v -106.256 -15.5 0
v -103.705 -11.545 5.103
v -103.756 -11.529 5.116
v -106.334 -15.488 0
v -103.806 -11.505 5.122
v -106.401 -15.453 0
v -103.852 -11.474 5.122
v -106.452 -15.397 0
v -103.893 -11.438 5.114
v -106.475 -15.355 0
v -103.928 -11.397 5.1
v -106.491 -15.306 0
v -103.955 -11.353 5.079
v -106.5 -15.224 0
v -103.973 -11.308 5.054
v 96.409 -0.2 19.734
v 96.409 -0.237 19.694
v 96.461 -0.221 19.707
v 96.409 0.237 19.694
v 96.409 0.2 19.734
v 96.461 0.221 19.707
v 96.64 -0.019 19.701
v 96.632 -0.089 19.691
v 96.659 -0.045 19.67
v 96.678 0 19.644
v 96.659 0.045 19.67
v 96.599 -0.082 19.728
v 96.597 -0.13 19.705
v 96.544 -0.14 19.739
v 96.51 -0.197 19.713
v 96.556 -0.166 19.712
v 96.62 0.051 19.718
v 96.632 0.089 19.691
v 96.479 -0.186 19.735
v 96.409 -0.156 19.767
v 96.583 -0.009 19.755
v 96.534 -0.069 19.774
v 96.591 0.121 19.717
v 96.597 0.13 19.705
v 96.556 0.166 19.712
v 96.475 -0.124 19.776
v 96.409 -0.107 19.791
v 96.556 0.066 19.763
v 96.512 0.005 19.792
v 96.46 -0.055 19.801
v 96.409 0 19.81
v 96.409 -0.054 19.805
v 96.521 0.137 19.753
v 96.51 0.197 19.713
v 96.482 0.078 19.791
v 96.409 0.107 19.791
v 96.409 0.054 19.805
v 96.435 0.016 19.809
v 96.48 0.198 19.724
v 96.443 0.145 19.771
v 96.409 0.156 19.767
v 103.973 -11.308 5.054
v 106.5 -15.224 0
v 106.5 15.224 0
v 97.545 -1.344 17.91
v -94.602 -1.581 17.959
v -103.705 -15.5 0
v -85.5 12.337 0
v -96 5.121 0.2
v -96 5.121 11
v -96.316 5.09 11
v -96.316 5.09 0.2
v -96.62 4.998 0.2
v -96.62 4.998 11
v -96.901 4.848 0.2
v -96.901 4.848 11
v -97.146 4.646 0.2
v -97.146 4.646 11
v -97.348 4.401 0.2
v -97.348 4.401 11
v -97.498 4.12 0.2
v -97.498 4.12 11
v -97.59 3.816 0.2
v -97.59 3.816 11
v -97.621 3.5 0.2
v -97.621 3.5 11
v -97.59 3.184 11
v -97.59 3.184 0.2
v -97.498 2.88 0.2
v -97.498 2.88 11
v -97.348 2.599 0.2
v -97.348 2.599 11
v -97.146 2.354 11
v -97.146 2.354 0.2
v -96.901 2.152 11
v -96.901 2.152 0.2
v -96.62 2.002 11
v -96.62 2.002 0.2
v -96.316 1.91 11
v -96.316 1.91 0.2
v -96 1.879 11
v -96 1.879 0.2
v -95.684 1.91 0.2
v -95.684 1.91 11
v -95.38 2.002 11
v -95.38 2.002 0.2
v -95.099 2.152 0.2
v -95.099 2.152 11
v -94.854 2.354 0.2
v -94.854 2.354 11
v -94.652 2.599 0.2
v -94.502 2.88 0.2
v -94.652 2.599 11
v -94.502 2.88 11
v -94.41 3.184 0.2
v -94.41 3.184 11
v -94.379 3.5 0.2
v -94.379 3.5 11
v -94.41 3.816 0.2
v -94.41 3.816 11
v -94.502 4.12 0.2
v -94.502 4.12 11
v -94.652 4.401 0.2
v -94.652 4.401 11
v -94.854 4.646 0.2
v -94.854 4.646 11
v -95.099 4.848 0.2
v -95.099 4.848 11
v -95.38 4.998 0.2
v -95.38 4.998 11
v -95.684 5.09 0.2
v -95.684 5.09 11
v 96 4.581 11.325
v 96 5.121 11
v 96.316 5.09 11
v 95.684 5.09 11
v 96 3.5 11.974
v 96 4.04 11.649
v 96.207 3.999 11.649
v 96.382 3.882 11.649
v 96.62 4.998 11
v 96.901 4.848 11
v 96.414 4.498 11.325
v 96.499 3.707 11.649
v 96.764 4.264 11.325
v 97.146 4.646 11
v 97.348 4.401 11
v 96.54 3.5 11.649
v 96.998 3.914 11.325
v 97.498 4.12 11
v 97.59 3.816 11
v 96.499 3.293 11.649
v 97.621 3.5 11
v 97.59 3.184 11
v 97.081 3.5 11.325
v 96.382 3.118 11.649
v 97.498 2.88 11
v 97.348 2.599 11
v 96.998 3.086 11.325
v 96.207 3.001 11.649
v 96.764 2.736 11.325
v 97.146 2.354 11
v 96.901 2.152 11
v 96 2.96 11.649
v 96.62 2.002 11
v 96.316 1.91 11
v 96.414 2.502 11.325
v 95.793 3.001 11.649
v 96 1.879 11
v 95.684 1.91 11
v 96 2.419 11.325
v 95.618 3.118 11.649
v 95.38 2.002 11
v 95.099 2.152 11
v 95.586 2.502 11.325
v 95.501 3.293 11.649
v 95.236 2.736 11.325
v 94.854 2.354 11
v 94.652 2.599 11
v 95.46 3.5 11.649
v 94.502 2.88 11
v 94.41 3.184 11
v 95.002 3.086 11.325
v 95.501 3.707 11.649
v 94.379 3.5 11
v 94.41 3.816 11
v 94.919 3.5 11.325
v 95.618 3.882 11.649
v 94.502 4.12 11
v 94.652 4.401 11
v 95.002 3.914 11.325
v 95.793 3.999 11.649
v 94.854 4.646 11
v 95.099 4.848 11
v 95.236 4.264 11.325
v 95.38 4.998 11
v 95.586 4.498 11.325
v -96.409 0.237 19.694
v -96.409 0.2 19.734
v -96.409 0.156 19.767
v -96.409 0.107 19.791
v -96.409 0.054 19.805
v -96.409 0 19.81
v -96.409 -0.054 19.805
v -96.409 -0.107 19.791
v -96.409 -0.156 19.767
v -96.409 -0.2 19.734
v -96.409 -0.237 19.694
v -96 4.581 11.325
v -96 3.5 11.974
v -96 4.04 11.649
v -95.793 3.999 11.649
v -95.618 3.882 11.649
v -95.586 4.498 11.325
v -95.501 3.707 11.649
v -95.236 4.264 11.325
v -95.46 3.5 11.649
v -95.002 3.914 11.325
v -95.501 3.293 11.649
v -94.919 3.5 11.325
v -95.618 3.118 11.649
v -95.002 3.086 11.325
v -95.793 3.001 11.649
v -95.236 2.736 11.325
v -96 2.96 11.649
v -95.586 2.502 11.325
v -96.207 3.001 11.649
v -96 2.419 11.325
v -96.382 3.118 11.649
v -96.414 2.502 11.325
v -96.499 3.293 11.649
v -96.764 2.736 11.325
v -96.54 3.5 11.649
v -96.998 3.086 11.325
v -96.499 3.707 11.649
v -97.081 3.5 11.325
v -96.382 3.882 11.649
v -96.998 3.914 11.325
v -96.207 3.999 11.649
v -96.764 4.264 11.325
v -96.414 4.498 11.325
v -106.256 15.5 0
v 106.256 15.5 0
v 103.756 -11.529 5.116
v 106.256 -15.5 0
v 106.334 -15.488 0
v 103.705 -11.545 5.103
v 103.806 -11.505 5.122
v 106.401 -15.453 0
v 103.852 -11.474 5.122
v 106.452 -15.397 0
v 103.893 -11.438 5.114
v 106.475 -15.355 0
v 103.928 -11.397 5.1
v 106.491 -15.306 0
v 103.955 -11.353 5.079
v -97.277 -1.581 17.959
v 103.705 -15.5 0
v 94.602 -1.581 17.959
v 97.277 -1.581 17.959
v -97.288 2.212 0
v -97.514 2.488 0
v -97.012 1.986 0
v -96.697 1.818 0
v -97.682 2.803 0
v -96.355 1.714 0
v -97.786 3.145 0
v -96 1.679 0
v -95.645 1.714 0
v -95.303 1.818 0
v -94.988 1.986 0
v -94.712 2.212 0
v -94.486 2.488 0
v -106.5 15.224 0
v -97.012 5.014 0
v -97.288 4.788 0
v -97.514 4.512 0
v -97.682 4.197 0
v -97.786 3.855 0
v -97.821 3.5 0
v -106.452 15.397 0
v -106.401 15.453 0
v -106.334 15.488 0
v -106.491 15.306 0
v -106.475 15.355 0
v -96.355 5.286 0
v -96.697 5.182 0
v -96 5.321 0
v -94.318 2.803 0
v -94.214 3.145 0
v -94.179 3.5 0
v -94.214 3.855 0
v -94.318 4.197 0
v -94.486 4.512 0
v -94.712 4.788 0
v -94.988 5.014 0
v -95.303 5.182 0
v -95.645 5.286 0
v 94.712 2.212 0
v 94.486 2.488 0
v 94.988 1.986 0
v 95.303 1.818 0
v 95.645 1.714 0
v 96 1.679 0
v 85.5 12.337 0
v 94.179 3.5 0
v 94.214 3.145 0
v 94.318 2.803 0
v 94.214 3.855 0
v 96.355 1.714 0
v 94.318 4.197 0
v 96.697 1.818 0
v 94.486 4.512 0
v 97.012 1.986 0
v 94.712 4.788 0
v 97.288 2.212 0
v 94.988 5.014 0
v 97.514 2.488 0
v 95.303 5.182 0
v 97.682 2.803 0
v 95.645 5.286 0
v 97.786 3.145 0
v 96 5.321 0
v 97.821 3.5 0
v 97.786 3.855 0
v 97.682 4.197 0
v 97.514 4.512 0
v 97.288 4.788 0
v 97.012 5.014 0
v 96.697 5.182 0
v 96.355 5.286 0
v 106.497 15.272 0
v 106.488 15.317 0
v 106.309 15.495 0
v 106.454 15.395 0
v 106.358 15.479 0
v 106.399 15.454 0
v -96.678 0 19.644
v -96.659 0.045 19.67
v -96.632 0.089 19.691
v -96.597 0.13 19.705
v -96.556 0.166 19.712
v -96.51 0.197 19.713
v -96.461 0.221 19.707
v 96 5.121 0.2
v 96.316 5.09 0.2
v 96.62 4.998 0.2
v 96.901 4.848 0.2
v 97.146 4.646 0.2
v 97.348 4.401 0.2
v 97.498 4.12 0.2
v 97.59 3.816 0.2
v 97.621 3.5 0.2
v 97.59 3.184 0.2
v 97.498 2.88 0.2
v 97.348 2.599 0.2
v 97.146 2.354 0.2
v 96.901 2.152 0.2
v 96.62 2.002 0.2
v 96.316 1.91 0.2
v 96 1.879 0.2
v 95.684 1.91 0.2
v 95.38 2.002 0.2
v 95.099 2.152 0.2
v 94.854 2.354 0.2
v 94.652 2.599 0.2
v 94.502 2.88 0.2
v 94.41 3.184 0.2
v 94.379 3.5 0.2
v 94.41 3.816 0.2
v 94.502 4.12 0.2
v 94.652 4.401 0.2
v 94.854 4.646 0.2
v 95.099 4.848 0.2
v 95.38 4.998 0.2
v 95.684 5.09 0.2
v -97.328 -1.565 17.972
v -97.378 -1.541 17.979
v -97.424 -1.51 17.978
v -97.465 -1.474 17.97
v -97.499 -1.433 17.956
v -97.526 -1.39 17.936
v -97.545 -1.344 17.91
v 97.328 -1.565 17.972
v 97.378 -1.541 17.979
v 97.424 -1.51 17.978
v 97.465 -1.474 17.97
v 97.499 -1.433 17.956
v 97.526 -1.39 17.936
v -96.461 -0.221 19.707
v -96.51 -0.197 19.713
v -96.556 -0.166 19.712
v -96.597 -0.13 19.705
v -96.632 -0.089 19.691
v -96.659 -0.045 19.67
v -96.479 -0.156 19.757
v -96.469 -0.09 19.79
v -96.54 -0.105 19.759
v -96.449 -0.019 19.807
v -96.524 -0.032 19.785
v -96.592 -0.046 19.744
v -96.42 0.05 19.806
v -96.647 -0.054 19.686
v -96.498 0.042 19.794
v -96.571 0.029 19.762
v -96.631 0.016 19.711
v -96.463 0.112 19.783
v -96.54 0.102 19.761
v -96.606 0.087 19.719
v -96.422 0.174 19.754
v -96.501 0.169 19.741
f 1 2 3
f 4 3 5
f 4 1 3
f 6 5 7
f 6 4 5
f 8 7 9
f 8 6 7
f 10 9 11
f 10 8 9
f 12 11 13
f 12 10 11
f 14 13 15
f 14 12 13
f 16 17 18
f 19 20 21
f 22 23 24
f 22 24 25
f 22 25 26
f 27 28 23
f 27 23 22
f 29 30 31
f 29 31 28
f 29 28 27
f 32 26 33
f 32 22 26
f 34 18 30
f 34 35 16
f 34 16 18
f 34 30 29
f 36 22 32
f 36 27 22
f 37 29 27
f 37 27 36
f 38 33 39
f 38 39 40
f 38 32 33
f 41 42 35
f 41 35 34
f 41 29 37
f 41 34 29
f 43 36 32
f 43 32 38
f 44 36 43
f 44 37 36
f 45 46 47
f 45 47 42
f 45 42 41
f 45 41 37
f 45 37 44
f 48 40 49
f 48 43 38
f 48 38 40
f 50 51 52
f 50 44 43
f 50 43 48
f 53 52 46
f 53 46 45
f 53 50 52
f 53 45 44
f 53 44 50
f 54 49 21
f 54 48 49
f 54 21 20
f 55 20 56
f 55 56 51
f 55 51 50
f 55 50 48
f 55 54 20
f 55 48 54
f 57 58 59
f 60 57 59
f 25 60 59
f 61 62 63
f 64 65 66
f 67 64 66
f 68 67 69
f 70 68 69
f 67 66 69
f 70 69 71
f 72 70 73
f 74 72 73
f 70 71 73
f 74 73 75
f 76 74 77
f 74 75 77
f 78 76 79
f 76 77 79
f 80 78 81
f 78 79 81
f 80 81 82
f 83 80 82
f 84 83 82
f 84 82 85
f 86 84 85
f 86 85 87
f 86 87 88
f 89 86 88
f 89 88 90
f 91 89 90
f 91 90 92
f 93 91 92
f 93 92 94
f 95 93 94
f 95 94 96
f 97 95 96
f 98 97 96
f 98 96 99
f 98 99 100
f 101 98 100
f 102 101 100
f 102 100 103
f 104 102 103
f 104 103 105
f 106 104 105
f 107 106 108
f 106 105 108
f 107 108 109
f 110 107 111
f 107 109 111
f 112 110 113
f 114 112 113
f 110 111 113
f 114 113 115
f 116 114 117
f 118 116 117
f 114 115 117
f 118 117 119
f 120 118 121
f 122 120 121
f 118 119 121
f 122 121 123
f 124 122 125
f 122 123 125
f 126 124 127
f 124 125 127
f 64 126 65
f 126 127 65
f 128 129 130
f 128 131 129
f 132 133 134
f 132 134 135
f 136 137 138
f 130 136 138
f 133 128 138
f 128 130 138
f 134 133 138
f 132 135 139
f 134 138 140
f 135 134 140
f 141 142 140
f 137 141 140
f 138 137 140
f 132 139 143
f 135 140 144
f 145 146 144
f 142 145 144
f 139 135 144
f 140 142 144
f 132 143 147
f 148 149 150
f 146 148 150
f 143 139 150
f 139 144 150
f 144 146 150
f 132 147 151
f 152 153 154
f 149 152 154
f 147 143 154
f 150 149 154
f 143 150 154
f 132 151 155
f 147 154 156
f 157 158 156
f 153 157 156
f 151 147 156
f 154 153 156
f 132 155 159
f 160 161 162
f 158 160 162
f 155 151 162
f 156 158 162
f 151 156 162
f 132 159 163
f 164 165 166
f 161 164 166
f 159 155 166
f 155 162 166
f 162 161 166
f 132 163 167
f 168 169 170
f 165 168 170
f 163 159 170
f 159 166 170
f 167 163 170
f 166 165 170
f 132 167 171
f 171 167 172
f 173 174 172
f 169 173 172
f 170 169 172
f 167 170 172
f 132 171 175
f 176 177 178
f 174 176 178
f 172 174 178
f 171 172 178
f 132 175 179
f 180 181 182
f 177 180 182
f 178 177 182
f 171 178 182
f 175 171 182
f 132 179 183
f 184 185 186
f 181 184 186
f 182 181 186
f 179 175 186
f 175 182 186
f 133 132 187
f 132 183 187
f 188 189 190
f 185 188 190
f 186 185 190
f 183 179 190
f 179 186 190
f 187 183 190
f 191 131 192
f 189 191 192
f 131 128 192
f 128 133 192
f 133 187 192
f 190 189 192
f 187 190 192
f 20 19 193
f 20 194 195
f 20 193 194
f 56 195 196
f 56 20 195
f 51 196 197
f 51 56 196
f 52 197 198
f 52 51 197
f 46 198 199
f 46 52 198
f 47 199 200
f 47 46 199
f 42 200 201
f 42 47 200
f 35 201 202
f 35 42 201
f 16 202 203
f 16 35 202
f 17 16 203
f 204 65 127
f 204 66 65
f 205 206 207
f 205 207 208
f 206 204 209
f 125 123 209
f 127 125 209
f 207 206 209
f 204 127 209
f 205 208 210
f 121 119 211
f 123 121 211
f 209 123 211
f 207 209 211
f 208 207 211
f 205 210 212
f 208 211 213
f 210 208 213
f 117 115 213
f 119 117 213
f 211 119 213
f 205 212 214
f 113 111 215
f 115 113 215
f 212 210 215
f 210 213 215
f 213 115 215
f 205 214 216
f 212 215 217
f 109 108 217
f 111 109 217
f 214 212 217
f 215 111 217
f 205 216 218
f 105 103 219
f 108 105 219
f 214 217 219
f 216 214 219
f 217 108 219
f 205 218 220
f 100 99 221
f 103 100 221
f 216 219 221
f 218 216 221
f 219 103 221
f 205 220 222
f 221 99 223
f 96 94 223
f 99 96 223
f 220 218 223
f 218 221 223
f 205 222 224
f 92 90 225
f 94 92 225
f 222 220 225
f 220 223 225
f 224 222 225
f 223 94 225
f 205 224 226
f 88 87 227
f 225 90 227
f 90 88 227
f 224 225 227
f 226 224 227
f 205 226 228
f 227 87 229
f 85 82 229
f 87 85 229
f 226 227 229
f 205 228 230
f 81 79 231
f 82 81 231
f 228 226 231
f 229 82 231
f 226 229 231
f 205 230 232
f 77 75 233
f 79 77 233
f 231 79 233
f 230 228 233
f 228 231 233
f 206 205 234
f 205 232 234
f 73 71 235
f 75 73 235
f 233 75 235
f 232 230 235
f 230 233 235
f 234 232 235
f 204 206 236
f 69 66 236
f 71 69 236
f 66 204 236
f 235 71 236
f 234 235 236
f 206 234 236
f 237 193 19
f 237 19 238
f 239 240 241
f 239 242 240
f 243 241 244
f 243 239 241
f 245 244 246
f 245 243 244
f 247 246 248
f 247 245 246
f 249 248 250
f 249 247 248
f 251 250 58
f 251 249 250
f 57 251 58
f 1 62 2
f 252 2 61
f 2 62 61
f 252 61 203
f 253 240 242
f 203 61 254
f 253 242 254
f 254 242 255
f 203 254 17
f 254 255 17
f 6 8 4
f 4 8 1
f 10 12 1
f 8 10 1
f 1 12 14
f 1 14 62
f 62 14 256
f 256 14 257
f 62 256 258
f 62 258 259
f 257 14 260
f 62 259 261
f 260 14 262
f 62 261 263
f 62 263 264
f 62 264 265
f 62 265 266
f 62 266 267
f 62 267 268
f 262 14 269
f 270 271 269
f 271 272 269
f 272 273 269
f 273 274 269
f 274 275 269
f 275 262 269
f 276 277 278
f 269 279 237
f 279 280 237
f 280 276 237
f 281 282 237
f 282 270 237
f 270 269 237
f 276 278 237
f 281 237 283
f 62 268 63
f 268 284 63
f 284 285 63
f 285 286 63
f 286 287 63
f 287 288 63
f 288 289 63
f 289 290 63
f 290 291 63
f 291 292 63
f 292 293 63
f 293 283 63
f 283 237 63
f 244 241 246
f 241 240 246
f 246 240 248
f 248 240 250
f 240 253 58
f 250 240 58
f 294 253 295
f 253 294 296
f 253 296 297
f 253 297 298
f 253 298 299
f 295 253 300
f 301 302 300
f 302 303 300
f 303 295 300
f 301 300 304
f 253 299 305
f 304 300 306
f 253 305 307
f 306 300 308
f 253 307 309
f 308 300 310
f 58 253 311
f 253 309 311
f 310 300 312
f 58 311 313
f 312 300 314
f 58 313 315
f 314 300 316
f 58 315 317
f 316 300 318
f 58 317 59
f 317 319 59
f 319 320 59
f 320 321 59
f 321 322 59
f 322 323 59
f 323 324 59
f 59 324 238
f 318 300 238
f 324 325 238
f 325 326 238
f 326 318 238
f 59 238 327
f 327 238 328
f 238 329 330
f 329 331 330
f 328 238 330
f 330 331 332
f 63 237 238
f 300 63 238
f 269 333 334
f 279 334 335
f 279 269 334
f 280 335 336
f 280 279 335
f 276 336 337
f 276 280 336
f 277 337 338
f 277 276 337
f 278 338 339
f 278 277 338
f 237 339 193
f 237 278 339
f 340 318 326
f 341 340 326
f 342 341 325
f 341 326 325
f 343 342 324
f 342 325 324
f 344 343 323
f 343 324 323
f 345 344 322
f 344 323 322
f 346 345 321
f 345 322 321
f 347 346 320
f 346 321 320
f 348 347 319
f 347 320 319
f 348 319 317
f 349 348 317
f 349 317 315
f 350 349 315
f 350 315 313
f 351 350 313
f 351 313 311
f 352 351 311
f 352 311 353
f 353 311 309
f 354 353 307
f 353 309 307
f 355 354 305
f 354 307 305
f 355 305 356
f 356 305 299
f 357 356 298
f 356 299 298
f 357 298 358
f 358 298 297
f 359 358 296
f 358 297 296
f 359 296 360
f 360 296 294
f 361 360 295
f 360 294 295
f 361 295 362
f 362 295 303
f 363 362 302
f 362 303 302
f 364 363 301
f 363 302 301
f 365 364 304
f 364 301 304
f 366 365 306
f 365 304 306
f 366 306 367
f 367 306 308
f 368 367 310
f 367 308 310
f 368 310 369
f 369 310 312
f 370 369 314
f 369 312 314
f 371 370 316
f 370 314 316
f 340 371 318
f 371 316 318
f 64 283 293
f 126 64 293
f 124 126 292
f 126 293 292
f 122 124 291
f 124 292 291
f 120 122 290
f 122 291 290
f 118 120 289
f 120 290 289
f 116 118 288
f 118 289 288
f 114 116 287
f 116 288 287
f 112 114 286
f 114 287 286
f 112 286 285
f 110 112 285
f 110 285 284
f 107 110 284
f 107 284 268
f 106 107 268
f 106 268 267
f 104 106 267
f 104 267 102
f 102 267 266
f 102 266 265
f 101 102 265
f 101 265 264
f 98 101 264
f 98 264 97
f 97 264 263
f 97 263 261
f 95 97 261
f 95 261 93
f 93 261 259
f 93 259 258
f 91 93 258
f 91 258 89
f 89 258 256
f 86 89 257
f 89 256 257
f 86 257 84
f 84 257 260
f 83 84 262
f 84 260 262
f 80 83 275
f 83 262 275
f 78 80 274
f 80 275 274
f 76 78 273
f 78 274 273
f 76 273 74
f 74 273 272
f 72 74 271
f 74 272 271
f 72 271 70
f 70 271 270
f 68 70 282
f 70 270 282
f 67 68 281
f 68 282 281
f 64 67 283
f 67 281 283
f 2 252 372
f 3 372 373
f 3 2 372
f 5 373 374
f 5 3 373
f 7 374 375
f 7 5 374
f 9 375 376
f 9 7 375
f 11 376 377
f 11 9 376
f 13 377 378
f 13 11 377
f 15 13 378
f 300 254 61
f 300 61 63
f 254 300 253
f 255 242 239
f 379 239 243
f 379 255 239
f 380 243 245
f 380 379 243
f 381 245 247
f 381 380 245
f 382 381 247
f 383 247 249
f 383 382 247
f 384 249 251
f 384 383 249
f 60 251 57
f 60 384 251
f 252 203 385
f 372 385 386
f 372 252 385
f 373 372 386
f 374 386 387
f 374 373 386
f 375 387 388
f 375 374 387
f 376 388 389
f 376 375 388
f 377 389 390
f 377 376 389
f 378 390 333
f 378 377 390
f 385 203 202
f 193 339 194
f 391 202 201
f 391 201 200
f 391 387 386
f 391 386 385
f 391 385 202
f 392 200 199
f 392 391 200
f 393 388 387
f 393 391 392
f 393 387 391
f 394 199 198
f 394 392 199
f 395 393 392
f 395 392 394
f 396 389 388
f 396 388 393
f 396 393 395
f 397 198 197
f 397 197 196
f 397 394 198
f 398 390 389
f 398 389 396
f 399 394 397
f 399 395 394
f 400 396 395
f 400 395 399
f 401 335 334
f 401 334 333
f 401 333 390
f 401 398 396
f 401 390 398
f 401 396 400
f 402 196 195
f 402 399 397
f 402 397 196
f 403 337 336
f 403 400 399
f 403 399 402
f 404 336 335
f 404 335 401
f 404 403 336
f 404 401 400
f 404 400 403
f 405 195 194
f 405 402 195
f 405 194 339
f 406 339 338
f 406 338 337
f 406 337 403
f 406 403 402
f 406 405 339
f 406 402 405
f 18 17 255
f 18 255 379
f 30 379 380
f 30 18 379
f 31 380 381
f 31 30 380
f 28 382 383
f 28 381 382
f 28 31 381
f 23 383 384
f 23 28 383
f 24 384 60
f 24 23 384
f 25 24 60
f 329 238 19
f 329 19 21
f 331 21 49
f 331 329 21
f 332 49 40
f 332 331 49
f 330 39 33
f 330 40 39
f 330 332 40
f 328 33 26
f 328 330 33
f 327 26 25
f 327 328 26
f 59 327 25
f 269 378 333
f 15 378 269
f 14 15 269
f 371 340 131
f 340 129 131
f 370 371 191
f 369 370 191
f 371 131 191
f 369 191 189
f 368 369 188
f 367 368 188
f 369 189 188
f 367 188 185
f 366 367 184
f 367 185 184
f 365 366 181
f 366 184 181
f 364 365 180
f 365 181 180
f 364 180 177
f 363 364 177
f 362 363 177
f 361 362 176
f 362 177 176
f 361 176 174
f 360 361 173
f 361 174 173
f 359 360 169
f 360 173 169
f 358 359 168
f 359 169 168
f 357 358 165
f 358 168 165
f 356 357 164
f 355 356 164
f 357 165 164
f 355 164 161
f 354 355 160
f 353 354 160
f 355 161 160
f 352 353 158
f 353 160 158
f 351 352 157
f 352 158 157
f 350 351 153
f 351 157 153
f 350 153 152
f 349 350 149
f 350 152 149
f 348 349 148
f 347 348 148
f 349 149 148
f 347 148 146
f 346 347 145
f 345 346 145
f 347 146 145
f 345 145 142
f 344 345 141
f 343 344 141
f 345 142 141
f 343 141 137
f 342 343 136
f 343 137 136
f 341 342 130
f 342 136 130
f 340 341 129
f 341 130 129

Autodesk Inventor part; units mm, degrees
ref_plane "YZ Plane" through (0, 0, 0) normal (1, 0, 0) x (0, 1, 0)
ref_plane "XZ Plane" through (0, 0, 0) normal (0, 1, 0) x (-1, 0, 0)
ref_plane "XY Plane" through (0, 0, 0) normal (0, 0, 1) x (1, 0, 0)
sketch "Sketch1" plane through (0, 0, 0) normal (0, 0, 1) x (1, 0, 0)
  line L0 (-106.5, -15.5) -> (106.5, -15.5)
  line L1 (106.5, -15.5) -> (106.5, 15.5)
  line L2 (106.5, 15.5) -> (-106.5, 15.5)
  line L3 (-106.5, 15.5) -> (-106.5, -15.5)
  line L4 (-106.5, -15.5) -> (106.5, 15.5) construction
  line L5 (106.5, -15.5) -> (-106.5, 15.5) construction
  point P0 (0, 0)
  dimension "L" = 213
  dimension "d1" = 31
extrude "Extrusion1" add sketch "Sketch1" along normal blind 20
sketch "Sketch2" plane through (106.5, -15.5, 0) normal (1, 0, 0) x (0, 0, -1)
  line L0 (0, 0) -> (-20, 0) projected
  line L1 (0, 0) -> (-20, 15.5)
  line L2 (-20, 0) -> (-20, 31) projected
  point P0 (0, 15.5)
extrude "Extrusion2" cut sketch "Sketch2" against normal through all
mirror "Mirror1" about plane through (0, 0, 0) normal (0, 1, 0) of "Extrusion2"
sketch "Sketch3" plane through (0, 0, 0) normal (0, 1, 0) x (-1, 0, 0)
  line L0 (106.5, 0) -> (-106.5, 0) projected
  line L1 (-106.5, 0) -> (-96.5, 20)
  line L2 (106.5, 20) -> (-106.5, 20) projected
  line L3 (-106.5, 0) -> (-106.5, 20) projected
  point P0 (0, 0)
  dimension "d6" = 10
extrude "Extrusion3" cut sketch "Sketch3" along normal through all both and the other way through all
mirror "Mirror2" about plane through (0, 0, 0) normal (1, 0, 0) of "Extrusion3"
shell "Shell1" thickness 2.5 removed faces 2 at (-32.1667, -10.3333, 6.6667) at (35.5, -5.1667, 0)
sketch "Sketch4" plane through (0, 0, 0) normal (0, 0, 1) x (1, 0, 0)
  line L0 (-106.5, -15.5) -> (-103.7049, -15.5) projected
  line L1 (-103.7049, -15.5) -> (-85.5, 12.3371)
  line L2 (103.7049, 12.3371) -> (-103.7049, 12.3371) projected
  line L3 (-106.5, 15.5) -> (-106.5, -15.5) projected
  line L4 (-103.7049, 12.3371) -> (-103.7049, -15.5) projected
  point P0 (0, 0)
  dimension "d10" = 21
extrude "Extrusion4" add sketch "Sketch4" along normal up to surface surface through (106.5, -1.976, 18.4686) normal (0, -0.7904151, -0.6125717)
ref_plane "Work Plane1" through (-106.5, -15.5, 0) normal (-0.8944272, 0, 0.4472136) x (0.4472136, 0, 0.8944272)
split "Split1" plane through (-106.5, -15.5, 0) removes the side toward (-0.8944272, 0, 0.4472136)
ref_plane "Work Plane2" through (-96.5, 0, 20) normal (0, -0.7904151, 0.6125717) x (1, 0, 0)
split "Split2" plane through (-96.5, 0, 20) removes the side toward (0, -0.7904151, 0.6125717)
mirror "Mirror3" about plane through (0, 0, 0) normal (1, 0, 0) of "Extrusion4", "Split1", "Split2"
fillet "Fillet1" radius 0.3 4 edges at (-101.5, 7.75, 10) (-101.5, -7.75, 10) (101.5, 7.75, 10) (101.5, -7.75, 10)
fillet "Fillet2" radius 0.3 3 edges at (96.4817, 0, 19.9011) (-96.4817, 0, 19.9011) (0, 0, 20)
sketch "Sketch5" plane through (0, 0, 0) normal (0, 0, -1) x (-1, 0, 0)
  line L0 (-96, 3.5) -> (96, 3.5)
  line L1 (-106.2565, 15.5) -> (106.2565, 15.5) projected
  point P0 (0, 0)
  point P1 (0, 3.5)
  dimension "d17" = 12
  dimension "BC" = 192
hole "Hole1" at (96, 3.5, 0) at (-96, 3.5, 0) direction (0, 0, 1) diameter 3.242 depth 11 tip angle 118 thread size "M4x0.7" class "6H" standard "ISO Metric profile"
chamfer "Chamfer1" distance 0.2 angle 45 2 edges at (96, 1.879, 0) (-96, 1.879, 0)
ref_plane "Work Plane3" through (106.5, -15.5, 0) normal (-0.8944272, 0, -0.4472136) x (-0.4472136, 0, 0.8944272)
properties part number "ESTAMP Post 6832 Gold L=149; BC=128" material "Zinc"
